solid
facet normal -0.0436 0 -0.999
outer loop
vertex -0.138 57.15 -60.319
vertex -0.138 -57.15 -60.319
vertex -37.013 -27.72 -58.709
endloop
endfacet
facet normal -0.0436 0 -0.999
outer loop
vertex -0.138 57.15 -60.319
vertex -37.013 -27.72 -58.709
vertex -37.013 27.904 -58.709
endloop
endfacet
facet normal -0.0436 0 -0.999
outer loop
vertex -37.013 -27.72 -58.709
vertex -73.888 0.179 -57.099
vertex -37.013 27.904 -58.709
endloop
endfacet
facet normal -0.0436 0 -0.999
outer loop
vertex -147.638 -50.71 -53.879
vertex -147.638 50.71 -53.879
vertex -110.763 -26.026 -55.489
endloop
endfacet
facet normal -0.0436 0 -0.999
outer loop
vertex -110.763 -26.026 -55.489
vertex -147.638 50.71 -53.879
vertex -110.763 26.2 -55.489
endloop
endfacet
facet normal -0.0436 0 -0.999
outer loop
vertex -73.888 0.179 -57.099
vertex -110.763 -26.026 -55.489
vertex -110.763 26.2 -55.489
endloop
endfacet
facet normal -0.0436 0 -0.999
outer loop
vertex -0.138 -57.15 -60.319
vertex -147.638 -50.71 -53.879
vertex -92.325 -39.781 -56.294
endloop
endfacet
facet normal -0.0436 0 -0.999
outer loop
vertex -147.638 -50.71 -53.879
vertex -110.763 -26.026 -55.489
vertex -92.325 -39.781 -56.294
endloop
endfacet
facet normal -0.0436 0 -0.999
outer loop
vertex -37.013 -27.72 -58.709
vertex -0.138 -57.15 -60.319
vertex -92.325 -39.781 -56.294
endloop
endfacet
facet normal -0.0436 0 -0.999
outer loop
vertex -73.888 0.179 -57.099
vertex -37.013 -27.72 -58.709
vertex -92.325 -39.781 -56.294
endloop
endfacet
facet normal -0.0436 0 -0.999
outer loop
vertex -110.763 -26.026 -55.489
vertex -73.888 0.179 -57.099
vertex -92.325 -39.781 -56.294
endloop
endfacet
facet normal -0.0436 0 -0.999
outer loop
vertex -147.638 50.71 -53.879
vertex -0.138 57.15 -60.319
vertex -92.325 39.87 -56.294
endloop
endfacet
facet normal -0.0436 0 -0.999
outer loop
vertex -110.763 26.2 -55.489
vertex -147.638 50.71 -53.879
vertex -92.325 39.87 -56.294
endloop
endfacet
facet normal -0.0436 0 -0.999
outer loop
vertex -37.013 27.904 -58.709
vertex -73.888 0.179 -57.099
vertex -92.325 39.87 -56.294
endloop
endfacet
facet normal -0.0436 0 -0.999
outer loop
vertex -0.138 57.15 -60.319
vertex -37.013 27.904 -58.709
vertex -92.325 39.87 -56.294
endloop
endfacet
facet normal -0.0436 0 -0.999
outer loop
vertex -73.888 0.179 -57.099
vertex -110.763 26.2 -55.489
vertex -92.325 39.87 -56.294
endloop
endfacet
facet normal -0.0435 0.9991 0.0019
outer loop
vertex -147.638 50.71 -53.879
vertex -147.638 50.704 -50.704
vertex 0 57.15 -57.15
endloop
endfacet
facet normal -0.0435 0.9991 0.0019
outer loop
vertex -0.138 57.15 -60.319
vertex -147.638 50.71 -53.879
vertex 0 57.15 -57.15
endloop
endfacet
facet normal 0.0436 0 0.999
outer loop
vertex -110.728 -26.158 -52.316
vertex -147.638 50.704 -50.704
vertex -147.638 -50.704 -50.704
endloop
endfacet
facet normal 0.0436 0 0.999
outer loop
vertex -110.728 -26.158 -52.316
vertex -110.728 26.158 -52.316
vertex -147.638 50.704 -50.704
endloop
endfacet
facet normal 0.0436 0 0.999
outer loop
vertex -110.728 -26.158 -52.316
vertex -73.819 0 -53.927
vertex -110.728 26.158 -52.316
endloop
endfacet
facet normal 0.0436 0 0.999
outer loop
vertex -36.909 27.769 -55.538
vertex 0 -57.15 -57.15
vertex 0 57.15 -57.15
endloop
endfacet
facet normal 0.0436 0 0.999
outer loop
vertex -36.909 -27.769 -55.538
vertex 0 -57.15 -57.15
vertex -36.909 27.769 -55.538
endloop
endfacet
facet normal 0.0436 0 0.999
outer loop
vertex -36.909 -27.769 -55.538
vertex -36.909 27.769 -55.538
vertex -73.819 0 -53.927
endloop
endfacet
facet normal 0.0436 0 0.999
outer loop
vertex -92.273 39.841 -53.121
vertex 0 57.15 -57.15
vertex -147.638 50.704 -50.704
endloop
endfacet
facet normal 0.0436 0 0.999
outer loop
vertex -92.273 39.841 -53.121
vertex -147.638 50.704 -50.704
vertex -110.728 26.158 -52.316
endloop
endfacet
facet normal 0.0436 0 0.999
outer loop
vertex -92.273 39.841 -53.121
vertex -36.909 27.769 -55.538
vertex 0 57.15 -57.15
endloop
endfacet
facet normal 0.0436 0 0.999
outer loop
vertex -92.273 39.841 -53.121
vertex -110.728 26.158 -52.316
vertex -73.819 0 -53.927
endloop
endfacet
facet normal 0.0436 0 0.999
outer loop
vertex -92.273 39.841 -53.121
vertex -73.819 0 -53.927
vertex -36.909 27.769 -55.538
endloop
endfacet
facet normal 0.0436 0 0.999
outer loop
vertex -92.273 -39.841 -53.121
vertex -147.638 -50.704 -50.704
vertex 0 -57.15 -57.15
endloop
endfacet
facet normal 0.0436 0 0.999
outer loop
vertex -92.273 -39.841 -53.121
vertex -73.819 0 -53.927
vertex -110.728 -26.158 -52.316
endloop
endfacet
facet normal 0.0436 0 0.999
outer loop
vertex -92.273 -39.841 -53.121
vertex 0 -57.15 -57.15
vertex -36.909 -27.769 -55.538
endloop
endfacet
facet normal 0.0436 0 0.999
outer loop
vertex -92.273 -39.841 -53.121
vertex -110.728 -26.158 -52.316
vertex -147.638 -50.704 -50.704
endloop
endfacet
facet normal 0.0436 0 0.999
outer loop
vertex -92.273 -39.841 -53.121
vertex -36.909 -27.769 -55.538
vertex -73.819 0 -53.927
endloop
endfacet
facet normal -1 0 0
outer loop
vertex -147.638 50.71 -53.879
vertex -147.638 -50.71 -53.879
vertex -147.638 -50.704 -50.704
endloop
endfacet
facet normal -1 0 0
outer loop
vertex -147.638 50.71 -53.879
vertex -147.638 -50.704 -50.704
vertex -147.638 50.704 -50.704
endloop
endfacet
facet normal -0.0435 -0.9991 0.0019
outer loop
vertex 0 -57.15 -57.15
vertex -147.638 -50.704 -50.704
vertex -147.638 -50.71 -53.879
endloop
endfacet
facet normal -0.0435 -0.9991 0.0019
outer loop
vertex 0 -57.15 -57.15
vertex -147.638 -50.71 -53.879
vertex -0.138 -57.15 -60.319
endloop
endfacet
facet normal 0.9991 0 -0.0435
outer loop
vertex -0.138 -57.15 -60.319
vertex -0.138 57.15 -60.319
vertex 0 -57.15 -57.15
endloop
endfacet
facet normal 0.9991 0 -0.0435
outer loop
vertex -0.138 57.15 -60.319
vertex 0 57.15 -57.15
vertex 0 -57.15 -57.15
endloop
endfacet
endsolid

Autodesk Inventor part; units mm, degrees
ref_plane "XZ Plane" through (0, 0, 0) normal (0, 1, 0) x (-1, 0, 0)
ref_plane "XY Plane" through (0, 0, 0) normal (0, 0, 1) x (1, 0, 0)
sketch "Sketch5" plane through (0, 0, 0) normal (1, 0, 0) x (0, 1, 0)
  line L0 (-60.325, -60.325) -> (60.325, -60.325)
  line L1 (60.325, -60.325) -> (60.325, 60.325)
  line L2 (60.325, 60.325) -> (-60.325, 60.325)
  line L3 (-60.325, 60.325) -> (-60.325, -60.325)
  line L4 (-60.325, -60.325) -> (60.325, 60.325) construction
  line L5 (60.325, -60.325) -> (-60.325, 60.325) construction
  line L6 (-57.15, -57.15) -> (57.15, -57.15)
  line L7 (57.15, -57.15) -> (57.15, 57.15)
  line L8 (57.15, 57.15) -> (-57.15, 57.15)
  line L9 (-57.15, 57.15) -> (-57.15, -57.15)
  line L10 (-57.15, -57.15) -> (57.15, 57.15) construction
  line L11 (57.15, -57.15) -> (-57.15, 57.15) construction
  point P0 (0, 0)
  dimension "d15" = 120.65
  dimension "d16" = 120.65
  dimension "d17" = 114.3
  dimension "d18" = 114.3
ref_plane "Work Plane1" through (-147.6375, 0, 0) normal (1, 0, 0) x (0, 1, 0)
sketch "Sketch16" plane through (0, 0, 0) normal (0, 1, 0) x (-1, 0, 0)
  line L0 (0, 57.15) -> (147.6375, 50.704)
  line L1 (147.6375, 50.704) -> (147.6375, 57.15)
  line L2 (147.6375, 57.15) -> (0, 57.15)
  point P0 (0, 0)
  point P1 (0, 57.15)
  dimension "d41" = 2.5
  dimension "d42" = 147.6375
sketch "Sketch17" plane through (-147.6375, 0, 0) normal (1, 0, 0) x (0, 1, 0)
  line L0 (-50.704, -50.704) -> (50.704, -50.704)
  line L1 (50.704, -50.704) -> (50.704, 50.704)
  line L2 (50.704, 50.704) -> (-50.704, 50.704)
  line L3 (-50.704, 50.704) -> (-50.704, -50.704)
  line L4 (-50.704, -50.704) -> (50.704, 50.704) construction
  line L5 (50.704, -50.704) -> (-50.704, 50.704) construction
  line L6 (-53.879, 53.879) -> (53.879, 53.879)
  line L7 (53.879, 53.879) -> (53.879, -53.879)
  line L8 (53.879, -53.879) -> (-53.879, -53.879)
  line L9 (-53.879, -53.879) -> (-53.879, 53.879)
  point P0 (0, 0)
  point P1 (0, 50.704)
  dimension "d44" = 3.175
loft "Loft3" add profiles "Sketch5", "Sketch17" contours L3 L2 L1 L0 | L9 L8 L7 L6 / L3 L2 L1 L0 | L6 L7 L8 L9
sketch "Sketch18" plane through (0, -60.325, -60.325) normal (1, 0, 0) x (0, 0, -1)
  line L0 (0, 0) -> (0, 120.65) projected
  line L1 (0, 120.65) -> (-120.65, 120.65) projected
  line L2 (-120.65, 120.65) -> (-120.65, 0) projected
  line L3 (-120.65, 0) -> (0, 0) projected
  line L4 (-117.475, 3.175) -> (-117.475, 117.475)
  line L5 (-117.475, 117.475) -> (-3.175, 117.475)
  line L6 (-3.175, 117.475) -> (-3.175, 3.175)
  line L7 (-3.175, 3.175) -> (-117.475, 3.175)
  point P0 (-60.325, 60.325)
  dimension "d49" = 3.175
sketch "Sketch19" plane through (-147.6375, -53.879, -53.879) normal (-1, 0, 0) x (0, 0, 1)
  line L0 (0, 0) -> (0, 107.758) projected
  line L1 (107.758, 0) -> (0, 0) projected
  line L2 (107.758, 107.758) -> (107.758, 0) projected
  line L3 (0, 107.758) -> (107.758, 107.758) projected
  line L4 (104.583, 3.175) -> (3.175, 3.175)
  line L5 (3.175, 3.175) -> (3.175, 104.583)
  line L6 (3.175, 104.583) -> (104.583, 104.583)
  line L7 (104.583, 104.583) -> (104.583, 3.175)
  point P0 (53.879, 53.879)
  dimension "d50" = 3.175
loft "Loft4" cut profiles "Sketch19", "Sketch18" contours L4 L5 L6 L7 / L4 L5 L6 L7
sketch "Sketch20" plane through (0, -57.15, -57.15) normal (0.0436, 0, 0.999) x (0.999, 0, -0.0436)
  line L0 (-147.7782, 6.446) -> (-147.7782, 107.854) projected
  line L1 (-147.7782, 6.446) -> (0, 0) projected
  line L2 (0, 114.3) -> (0, 0) projected
  line L3 (-147.7782, 107.854) -> (0, 114.3) projected
  point P0 (-2.4928, 57.15)
extrude "Extrusion6" cut sketch "Sketch20" against normal through all keep common part
equation "\"d15\" = width - internalAcrylicThickness"
equation "\"d16\" = height - internalAcrylicThicnkess"
equation "\"d17\" = -2 * mirrorThickness + width - internalAcrylicThickness"
equation "\"d18\" = -internalAcrylicThicnkess + height - 2 * mirrorThickness"
equation "\"d41\" = mirrorAngle"
equation "\"d44\" = mirrorThickness"
equation "\"d49\" = mirrorThickness"
equation "\"d50\" = mirrorThickness"
equation "\"width\" = 127"
equation "\"depth\" = 203.2"
equation "\"mirrorAngle\" = 2.5deg"
equation "\"mirrorThickness\" = 3.175"
equation "\"fresnelThickness\" = 0.254"
equation "\"centerThickness\" = 1.27"
equation "\"acrylicThickness\" = 6.35"
equation "\"height\" = 127"
equation "\"detectorWidth\" = 52"
equation "\"detectorHeight\" = 52"
equation "\"focalLength\" = 152.4"
equation "\"ior\" = 1.49"
equation "\"fresnelAngle\" = 90deg"
equation "\"fresnelEffectiveDiameter\" = 152.4"
equation "\"mirrorSuppourtWidth\" = 38.1"
equation "\"backGrooveBit\" = 4.8006"
equation "\"sensorHolderWidth\" = 88.9"
equation "\"sensorHolderHeight\" = 88.9"
equation "\"sensorHolderSensorHeight\" = 53.975"
equation "\"sensorHolderSensorWidth\" = 53.975"
equation "\"oRingWidth\" = 1.5875"
equation "\"sensorHolderORingID\" = 203.2"
equation "\"sensorHolderFlushORingID\" = 304.8"
equation "\"frontBackORingID\" = 419.1"
equation "\"mirrorGroove\" = 19.05"
equation "\"backMirrorGroove\" = 6.35"
equation "\"fresnelMirrorChamfer\" = 6.35"
equation "\"mirrorGrooveMill\" = 3.175"
equation "\"detectorOpeningWidth\" = 76.2"
equation "\"detectorOpeningHeight\" = 76.2"
equation "\"sensorHolderDepth\" = 19.05"
equation "\"frameAcrylicThickness\" = 9.525"
equation "\"internalAcrylicThicnkess\" = 6.35"
equation "\"internalAcrylicThickness\" = 6.35"
equation "\"aerogelClearence\" = 3.175"
equation "\"backplanePCBHeight\" = 76.2"
equation "\"backplaneHoleOffsett\" = 6.35"
equation "\"backplanePCBWidth\" = 76.2"
equation "\"backplanePostionOffsett\" = 12.7"
equation "\"moduleSlotClearence\" = 0.79375"
equation "\"plasticThickness\" = 6.35"
equation "\"aerogelHolderDepth\" = 49.022"
equation "\"caseThickness\" = 6.35"
equation "\"alignmantGrooveDepth\" = 1.5875"
equation "\"alignmentGrooveDepth\" = 1.5875"
equation "\"alignmentGrooveClearance\" = 0.1016"
equation "\"frontPanelThickness\" = 1.5875"
equation "\"fresnelGrooveWidth\" = 1.778"
properties part number "mirrorSides" material "Glass"
